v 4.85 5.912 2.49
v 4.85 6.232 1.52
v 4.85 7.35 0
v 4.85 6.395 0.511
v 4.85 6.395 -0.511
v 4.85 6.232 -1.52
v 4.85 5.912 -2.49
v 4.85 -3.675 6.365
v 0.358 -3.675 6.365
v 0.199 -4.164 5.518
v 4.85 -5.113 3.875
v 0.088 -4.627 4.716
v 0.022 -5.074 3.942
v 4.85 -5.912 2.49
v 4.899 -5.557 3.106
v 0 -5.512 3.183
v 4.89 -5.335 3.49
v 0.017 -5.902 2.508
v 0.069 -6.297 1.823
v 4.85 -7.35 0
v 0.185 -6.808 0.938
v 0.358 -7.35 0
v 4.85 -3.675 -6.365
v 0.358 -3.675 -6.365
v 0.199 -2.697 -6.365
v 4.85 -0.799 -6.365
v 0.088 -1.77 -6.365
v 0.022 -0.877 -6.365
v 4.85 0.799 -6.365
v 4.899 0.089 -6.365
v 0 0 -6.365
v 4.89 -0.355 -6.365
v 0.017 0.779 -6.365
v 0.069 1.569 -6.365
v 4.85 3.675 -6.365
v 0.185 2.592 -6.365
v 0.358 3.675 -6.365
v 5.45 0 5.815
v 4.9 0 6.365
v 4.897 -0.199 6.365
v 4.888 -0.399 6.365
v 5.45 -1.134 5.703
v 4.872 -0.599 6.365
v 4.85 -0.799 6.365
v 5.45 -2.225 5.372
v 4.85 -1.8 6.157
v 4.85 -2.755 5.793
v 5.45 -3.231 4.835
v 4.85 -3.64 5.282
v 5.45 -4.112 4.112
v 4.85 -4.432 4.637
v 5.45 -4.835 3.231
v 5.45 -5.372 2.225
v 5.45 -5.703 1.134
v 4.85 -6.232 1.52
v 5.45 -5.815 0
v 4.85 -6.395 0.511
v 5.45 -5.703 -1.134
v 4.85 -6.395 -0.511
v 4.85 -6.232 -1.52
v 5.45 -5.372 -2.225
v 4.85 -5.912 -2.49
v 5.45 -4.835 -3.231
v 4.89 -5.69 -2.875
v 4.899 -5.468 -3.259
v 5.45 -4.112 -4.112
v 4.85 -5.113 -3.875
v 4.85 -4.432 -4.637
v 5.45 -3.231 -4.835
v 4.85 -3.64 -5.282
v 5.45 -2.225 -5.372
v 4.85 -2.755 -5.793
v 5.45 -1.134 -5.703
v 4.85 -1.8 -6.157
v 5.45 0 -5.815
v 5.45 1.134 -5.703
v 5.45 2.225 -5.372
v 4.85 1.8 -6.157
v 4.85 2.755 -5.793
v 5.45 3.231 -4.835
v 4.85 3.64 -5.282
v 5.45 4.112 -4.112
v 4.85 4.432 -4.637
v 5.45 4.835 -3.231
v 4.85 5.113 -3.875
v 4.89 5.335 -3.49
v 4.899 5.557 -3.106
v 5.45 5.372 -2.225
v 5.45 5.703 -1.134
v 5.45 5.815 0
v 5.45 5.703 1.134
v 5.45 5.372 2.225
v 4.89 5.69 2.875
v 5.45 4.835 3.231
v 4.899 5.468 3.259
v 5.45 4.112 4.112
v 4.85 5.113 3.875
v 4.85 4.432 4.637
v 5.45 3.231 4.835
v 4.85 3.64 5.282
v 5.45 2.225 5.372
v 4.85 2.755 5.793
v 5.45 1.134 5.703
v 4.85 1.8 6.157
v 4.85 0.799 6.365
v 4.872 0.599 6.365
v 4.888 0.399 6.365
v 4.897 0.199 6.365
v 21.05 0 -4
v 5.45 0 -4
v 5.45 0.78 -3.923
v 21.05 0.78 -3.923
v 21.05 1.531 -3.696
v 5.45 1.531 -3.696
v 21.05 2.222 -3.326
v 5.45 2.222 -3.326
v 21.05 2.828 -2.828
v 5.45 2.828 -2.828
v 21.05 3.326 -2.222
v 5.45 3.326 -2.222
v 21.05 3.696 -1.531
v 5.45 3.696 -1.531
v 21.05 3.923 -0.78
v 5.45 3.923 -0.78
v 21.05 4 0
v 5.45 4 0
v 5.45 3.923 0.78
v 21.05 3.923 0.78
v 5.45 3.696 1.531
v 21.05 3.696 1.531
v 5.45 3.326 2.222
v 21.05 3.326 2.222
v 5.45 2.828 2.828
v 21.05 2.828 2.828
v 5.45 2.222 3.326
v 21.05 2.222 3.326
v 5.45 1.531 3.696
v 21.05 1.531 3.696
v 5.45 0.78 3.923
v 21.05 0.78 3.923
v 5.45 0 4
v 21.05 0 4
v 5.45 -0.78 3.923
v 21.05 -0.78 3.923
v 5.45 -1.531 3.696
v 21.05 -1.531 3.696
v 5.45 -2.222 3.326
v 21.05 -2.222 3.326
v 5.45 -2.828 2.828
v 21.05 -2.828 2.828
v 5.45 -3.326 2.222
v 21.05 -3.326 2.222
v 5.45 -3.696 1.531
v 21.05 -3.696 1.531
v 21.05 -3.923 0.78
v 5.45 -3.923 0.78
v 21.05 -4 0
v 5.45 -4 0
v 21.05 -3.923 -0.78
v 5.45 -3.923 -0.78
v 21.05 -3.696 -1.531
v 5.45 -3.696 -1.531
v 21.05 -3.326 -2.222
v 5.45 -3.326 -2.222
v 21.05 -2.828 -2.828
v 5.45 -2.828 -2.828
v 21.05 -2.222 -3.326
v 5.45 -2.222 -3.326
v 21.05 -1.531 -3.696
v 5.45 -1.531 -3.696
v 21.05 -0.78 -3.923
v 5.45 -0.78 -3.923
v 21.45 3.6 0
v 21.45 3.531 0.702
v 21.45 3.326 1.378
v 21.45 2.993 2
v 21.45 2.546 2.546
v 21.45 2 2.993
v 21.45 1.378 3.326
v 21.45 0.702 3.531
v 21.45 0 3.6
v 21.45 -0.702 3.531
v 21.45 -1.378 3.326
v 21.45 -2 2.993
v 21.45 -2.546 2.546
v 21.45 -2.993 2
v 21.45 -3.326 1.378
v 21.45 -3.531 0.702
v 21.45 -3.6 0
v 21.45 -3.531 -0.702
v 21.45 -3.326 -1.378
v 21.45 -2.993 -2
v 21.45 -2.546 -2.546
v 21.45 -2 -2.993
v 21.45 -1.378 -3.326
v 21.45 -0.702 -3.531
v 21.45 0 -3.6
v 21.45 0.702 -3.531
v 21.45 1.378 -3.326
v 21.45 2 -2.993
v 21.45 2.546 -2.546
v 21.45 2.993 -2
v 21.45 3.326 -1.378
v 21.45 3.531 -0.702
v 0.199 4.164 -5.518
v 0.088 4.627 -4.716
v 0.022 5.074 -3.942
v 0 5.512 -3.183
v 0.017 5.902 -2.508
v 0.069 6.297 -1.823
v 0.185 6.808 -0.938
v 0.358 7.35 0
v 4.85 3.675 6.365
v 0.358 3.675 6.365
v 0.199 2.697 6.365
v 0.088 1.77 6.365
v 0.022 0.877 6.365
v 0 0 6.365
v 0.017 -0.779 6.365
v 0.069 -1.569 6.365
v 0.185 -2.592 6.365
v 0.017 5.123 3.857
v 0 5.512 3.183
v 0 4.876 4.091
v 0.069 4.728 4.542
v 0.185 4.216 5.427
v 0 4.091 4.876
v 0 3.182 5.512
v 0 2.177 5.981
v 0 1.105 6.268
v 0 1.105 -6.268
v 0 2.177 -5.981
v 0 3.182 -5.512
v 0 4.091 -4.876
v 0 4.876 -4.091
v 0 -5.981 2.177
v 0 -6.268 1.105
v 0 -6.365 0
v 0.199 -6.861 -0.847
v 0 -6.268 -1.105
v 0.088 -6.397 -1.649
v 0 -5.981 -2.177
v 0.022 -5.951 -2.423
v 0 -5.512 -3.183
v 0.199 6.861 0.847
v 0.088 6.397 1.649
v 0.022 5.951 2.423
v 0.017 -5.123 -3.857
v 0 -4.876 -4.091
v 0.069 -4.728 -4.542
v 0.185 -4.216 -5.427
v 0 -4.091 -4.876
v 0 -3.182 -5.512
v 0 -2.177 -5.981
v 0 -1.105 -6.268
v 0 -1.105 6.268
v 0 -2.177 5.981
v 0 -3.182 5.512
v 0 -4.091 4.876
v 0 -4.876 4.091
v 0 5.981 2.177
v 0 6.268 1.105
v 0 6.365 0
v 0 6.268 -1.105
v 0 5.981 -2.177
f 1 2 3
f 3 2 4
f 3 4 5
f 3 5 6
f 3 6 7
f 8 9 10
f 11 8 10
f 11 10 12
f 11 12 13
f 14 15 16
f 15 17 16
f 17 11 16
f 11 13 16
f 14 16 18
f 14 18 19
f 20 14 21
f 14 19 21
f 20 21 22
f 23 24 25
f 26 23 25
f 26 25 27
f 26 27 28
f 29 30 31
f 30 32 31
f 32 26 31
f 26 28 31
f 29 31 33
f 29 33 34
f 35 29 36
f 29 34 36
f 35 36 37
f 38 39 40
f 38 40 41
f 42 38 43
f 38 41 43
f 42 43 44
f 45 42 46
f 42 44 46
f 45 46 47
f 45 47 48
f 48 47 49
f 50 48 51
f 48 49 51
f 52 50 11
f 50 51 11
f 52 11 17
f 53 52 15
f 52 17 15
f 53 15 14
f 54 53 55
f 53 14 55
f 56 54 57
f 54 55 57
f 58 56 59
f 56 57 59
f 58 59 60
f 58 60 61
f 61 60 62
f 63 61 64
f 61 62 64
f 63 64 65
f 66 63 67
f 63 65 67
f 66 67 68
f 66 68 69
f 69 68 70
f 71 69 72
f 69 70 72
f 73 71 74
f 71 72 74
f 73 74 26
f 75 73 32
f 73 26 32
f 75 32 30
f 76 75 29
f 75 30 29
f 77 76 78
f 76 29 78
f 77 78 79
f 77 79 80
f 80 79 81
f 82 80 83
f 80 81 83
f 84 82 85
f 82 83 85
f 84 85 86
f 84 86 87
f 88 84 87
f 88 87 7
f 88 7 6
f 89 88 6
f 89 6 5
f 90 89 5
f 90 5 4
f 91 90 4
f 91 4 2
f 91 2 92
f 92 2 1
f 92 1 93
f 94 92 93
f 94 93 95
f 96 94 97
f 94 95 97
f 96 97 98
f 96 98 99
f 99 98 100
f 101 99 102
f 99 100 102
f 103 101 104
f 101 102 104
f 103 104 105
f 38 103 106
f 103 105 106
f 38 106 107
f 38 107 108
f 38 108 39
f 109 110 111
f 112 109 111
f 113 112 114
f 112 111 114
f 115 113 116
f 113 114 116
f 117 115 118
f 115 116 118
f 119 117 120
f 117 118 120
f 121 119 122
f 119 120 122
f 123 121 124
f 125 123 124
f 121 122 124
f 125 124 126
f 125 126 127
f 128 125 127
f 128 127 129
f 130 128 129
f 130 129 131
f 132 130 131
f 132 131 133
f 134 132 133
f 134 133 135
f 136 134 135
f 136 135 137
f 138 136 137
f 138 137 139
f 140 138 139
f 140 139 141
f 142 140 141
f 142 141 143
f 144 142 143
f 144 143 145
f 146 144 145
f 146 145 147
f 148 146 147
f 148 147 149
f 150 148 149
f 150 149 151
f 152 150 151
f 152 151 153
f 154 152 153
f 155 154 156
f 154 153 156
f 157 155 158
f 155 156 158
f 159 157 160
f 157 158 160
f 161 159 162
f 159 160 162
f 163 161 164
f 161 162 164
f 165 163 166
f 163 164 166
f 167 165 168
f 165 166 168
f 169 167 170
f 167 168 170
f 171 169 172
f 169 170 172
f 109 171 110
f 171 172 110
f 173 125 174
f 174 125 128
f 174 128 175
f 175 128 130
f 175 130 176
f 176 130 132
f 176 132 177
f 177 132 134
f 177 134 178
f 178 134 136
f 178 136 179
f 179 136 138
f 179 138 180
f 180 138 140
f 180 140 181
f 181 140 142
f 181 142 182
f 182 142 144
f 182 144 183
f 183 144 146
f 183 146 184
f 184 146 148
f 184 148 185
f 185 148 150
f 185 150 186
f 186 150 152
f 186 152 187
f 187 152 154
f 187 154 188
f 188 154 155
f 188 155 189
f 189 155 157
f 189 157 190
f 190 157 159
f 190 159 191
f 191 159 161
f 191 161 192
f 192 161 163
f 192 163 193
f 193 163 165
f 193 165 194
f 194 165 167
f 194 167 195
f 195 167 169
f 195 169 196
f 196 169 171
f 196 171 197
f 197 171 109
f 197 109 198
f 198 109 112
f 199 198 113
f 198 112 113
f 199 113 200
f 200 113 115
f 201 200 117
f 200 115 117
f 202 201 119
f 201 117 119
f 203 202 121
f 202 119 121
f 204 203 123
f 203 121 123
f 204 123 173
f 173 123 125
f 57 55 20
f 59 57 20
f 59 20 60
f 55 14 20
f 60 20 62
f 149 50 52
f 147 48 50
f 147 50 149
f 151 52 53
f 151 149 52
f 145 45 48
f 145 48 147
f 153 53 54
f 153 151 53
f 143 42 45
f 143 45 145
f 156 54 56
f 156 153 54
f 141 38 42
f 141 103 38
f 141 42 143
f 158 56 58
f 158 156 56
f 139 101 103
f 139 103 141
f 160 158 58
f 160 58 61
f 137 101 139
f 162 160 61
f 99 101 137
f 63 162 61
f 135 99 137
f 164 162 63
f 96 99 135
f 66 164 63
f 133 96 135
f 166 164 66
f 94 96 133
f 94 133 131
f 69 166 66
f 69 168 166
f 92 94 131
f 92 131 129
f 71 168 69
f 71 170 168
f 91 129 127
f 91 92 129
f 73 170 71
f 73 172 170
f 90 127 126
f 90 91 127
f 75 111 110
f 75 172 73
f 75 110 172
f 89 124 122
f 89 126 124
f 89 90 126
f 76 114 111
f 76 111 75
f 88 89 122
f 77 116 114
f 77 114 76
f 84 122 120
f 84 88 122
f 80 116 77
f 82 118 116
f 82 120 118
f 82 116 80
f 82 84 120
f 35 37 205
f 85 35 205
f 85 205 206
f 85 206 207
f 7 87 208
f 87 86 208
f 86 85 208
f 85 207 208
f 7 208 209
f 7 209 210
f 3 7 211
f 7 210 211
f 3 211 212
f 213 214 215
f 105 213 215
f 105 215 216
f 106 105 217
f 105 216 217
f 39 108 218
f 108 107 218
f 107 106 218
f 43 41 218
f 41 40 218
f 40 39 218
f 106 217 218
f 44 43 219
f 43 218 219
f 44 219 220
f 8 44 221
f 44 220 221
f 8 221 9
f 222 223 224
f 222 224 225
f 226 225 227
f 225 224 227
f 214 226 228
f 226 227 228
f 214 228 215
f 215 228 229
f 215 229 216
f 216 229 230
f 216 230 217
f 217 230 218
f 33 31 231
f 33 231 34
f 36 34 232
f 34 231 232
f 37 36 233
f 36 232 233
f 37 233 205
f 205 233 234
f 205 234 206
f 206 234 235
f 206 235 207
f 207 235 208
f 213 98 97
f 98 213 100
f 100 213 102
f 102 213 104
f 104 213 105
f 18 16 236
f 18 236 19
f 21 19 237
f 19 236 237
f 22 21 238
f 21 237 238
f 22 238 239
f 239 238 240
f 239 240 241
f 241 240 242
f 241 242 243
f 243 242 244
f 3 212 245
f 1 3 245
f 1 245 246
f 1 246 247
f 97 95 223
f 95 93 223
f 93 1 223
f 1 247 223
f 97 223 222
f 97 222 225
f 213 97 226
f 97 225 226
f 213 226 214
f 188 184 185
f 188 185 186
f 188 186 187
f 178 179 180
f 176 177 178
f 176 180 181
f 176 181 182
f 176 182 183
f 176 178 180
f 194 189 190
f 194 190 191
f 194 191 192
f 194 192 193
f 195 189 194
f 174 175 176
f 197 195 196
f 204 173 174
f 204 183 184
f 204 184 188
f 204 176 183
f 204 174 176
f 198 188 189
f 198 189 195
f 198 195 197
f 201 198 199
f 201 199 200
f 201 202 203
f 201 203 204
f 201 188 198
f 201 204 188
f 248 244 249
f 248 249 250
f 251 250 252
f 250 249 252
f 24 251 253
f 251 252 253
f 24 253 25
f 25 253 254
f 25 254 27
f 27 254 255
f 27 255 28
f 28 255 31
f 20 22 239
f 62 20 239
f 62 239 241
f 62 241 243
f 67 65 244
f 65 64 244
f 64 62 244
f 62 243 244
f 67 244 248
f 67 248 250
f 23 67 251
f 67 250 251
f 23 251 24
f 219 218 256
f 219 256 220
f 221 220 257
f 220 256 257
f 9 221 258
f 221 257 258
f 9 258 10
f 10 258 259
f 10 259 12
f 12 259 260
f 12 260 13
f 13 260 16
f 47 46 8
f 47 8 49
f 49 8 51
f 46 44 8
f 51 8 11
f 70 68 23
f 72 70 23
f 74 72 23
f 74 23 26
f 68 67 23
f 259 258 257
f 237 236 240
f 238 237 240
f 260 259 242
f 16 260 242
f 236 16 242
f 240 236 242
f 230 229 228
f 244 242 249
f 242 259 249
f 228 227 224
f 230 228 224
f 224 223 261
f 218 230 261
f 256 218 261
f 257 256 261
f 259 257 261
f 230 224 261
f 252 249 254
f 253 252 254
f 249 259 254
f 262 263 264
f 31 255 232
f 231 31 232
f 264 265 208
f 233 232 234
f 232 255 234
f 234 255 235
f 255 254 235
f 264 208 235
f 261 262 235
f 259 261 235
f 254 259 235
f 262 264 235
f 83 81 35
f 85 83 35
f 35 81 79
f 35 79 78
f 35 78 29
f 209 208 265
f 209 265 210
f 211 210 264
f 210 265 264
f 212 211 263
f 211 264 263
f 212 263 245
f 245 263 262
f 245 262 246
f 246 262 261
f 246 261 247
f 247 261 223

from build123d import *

# Parameters (mm, degrees)
BASEHEAD_DEPTH = 5.45
SKETCH5_R      = 4
BASEBODY_DEPTH = 16


with BuildPart() as part:
    # Sketch2 → BaseHead (new body)
    with BuildSketch(Plane(origin=(0, 0, 0), x_dir=(0, 0, -1), z_dir=(1, 0, 0))):
        Polygon((6.365, -3.674834463), (6.365, 3.674834463), (0, 7.349668927), (-6.365, 3.674834463), (-6.365, -3.674834463), (0, -7.349668927), align=None)
    extrude(amount=BASEHEAD_DEPTH)

    # Sketch3 → BearingFace (revolve, cut)
    with BuildSketch(Plane.XY, mode=Mode.PRIVATE) as bearingface_sk:
        Polygon((5.45, 7.349668927), (5.45, 5.815), (4.85, 6.415), (4.85, 7.349668927), align=None)
    revolve(bearingface_sk.sketch.rotate(Axis((-0.957090588, 0, 0), (1, 0, 0)), 90), axis=Axis((-0.957090588, 0, 0), (1, 0, 0)), mode=Mode.SUBTRACT)

    # Sketch4 → HeadChamfer (revolve, cut)
    with BuildSketch(Plane.XY):
        Polygon((0, 7.349668927), (0.35839018, 7.349668927), (0, 6.365), align=None)
    revolve(axis=Axis((-0.493528746, 0, 0), (1, 0, 0)), mode=Mode.SUBTRACT)

    # Sketch5 → BaseBody (add)
    with BuildSketch(Plane(origin=(5.45, 0, 0), x_dir=(0, 0, -1), z_dir=(1, 0, 0))):
        Circle(SKETCH5_R)
    extrude(amount=BASEBODY_DEPTH)

    # Chamfer1: read off the stored shape, not the designer's step
    # Chamfer1 outline → Chamfer1 (revolve, cut)
    with BuildSketch(Plane.YX):
        Polygon((4, 21.45), (3.6, 21.45), (4, 21.05), align=None)
    revolve(axis=Axis((0, 0, 0), (1, 0, 0)), mode=Mode.SUBTRACT)


solid = part.part
